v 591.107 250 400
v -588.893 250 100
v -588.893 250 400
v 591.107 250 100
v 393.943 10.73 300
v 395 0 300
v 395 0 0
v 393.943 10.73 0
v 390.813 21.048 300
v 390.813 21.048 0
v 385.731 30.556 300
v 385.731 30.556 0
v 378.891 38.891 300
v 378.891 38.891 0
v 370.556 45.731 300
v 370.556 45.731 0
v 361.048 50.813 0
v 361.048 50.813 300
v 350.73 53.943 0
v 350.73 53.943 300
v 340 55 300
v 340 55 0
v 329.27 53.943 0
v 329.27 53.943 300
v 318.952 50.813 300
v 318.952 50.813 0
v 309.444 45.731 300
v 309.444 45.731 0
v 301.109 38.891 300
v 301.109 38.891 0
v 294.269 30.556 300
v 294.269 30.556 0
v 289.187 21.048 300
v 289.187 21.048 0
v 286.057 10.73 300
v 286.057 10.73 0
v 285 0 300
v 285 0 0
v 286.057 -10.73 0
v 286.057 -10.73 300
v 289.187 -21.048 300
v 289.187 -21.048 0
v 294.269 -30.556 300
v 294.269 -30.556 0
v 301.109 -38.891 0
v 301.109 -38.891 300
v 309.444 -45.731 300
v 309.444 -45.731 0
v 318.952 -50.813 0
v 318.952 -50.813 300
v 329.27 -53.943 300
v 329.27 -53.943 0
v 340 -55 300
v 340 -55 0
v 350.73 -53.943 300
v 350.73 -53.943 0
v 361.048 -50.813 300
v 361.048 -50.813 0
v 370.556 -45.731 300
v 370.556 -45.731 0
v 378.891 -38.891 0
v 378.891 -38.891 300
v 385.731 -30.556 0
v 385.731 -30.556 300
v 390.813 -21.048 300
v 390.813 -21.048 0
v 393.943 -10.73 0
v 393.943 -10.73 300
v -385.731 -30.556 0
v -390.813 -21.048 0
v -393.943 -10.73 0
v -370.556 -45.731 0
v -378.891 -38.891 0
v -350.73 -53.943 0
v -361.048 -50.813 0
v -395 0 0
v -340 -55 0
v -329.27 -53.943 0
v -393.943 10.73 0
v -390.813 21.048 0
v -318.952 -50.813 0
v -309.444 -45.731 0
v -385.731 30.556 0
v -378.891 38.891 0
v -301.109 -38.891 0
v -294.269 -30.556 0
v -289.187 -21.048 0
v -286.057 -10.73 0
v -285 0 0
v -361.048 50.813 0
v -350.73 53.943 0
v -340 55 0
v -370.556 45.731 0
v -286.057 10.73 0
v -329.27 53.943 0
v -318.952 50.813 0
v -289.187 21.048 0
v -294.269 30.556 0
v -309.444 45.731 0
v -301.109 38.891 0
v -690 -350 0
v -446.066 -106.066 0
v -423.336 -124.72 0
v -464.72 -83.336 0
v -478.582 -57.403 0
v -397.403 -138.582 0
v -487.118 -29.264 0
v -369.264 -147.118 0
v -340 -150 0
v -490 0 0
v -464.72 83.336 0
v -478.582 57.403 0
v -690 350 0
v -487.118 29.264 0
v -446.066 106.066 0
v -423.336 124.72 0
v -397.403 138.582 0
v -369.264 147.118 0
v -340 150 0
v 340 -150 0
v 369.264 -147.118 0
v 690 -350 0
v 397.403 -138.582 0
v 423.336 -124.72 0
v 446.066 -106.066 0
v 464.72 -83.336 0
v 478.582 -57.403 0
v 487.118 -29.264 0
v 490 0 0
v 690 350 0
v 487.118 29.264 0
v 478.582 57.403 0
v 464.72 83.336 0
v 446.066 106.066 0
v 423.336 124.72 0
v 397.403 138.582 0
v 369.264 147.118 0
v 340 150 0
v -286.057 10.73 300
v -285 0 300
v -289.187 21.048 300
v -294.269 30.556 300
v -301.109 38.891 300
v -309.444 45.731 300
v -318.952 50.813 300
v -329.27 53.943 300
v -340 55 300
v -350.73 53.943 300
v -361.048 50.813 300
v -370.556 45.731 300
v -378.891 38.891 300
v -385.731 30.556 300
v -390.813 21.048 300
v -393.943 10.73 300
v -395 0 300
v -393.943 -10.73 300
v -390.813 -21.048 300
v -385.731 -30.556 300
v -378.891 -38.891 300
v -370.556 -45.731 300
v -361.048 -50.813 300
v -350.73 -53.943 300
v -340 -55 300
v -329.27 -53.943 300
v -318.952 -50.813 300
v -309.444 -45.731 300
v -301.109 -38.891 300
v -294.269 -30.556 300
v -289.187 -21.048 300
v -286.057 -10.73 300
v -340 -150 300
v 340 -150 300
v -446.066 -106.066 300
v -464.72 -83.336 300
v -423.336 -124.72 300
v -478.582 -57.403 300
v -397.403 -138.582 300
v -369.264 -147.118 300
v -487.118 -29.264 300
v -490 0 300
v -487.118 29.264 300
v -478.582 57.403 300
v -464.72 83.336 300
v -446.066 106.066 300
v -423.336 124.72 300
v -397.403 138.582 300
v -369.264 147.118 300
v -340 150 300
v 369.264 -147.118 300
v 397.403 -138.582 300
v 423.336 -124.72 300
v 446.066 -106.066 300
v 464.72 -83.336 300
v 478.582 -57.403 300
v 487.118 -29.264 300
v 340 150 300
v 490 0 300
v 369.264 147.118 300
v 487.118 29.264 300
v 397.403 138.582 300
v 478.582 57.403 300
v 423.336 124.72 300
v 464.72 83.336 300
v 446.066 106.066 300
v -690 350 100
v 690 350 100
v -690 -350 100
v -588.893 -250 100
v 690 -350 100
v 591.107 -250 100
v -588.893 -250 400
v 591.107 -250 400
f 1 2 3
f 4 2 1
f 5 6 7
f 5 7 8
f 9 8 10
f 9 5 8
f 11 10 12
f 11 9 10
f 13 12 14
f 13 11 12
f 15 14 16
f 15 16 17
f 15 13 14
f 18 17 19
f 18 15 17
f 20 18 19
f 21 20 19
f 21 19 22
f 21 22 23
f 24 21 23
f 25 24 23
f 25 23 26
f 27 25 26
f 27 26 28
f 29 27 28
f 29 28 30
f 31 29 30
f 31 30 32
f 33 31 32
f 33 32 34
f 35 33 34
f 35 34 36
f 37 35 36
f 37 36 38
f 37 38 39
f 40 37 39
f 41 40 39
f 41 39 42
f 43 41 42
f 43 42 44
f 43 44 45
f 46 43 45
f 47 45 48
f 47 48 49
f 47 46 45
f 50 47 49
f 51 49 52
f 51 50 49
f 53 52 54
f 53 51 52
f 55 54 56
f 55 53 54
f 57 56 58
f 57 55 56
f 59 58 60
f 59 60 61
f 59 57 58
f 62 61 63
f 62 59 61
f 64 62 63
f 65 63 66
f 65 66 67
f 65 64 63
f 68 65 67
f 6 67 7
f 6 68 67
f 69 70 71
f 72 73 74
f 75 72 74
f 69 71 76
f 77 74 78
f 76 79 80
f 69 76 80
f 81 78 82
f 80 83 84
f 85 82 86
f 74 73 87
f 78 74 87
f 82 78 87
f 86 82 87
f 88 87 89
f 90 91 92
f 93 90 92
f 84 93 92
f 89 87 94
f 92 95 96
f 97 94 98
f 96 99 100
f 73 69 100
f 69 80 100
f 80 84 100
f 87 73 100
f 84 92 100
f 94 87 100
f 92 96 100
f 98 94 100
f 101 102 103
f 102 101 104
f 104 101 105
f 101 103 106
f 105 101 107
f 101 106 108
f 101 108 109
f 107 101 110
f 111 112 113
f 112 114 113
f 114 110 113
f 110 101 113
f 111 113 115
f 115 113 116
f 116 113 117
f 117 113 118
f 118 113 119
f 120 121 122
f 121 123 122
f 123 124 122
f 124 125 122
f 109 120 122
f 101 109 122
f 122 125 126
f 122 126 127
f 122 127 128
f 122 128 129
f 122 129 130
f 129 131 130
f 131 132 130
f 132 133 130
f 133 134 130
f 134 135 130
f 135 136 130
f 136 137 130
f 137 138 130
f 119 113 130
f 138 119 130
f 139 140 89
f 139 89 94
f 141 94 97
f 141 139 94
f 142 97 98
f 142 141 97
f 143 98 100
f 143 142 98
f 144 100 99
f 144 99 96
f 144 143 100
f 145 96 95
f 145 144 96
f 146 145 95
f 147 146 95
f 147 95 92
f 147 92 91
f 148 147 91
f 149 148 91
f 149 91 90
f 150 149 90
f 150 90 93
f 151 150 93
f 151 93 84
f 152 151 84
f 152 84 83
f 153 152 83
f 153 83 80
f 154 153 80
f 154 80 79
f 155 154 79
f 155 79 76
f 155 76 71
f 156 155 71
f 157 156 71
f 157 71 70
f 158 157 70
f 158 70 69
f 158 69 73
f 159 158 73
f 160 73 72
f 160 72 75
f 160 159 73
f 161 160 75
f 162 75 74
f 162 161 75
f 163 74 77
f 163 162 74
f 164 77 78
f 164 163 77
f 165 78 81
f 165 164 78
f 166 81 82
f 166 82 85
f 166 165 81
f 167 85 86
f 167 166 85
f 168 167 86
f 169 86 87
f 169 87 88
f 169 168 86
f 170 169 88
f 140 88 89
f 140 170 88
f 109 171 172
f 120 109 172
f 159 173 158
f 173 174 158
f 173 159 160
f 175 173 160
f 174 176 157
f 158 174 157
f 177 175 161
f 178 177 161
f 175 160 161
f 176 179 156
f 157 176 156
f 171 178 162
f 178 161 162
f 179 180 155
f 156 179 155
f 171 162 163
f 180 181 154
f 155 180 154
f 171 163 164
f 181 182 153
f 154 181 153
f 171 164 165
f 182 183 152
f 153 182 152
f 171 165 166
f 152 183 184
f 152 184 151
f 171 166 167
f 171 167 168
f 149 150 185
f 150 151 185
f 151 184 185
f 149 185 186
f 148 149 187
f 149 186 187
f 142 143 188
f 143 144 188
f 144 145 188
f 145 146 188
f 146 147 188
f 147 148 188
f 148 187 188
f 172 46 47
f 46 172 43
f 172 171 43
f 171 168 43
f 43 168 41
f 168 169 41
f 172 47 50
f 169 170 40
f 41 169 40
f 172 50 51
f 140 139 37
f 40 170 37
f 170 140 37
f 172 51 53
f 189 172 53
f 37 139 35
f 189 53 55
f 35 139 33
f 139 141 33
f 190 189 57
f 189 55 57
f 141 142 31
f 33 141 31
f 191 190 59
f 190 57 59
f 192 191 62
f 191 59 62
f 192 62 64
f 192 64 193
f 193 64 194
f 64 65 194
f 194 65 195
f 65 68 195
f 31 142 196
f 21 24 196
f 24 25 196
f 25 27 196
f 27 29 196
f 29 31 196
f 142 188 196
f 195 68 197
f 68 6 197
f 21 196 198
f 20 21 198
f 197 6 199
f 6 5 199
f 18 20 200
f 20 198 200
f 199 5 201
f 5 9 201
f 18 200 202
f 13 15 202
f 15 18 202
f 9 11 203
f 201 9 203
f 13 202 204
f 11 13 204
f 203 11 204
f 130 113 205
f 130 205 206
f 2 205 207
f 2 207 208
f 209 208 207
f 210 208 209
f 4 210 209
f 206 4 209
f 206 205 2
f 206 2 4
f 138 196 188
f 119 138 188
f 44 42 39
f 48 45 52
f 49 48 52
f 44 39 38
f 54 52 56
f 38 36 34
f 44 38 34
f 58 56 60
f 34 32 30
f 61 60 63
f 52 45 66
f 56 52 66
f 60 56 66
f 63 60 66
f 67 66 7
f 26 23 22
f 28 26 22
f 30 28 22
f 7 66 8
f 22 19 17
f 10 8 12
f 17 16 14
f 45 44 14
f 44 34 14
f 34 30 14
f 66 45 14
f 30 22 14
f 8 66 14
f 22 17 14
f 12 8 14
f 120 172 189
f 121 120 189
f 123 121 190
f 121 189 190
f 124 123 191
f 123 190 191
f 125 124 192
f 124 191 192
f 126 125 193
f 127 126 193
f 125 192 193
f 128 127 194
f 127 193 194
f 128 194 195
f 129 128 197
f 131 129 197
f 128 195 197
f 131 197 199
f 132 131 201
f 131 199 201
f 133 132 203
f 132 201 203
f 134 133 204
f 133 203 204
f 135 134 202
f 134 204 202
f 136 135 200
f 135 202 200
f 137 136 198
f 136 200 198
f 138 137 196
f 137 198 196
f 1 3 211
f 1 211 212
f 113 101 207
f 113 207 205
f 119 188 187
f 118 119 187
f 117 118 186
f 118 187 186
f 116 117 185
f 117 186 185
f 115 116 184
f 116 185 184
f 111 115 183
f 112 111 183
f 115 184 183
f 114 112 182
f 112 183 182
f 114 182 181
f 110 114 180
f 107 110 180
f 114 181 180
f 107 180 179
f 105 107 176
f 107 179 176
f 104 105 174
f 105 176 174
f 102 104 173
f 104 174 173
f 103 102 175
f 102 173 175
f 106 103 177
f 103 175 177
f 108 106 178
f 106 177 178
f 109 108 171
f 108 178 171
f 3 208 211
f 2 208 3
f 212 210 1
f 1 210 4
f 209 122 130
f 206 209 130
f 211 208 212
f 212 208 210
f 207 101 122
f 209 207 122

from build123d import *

# Parameters (mm, degrees)
F0_W     = 1380
F0_H     = 700
F0_W_2   = 1180
F0_H_2   = 500
F1_DEPTH = 100
F2_W     = 1180
F2_H     = 500
F3_DEPTH = 300
F4_R     = 55
F5_DEPTH = 1819
F6_DEPTH = 400.001
F8_DEPTH = 100


# Not quite as in the source:
# - an extrude ends at something that could not be found from the text; its depth is read off the source's solid
# - a feature of the source that left no trace in its solid (it failed there, or was rolled back) is left out


with BuildPart() as f1:
    # F0 (on Top) → F1 (new body)
    with BuildSketch(Plane.XY):
        Rectangle(F0_W, F0_H)
        Rectangle(F0_W_2, F0_H_2, mode=Mode.SUBTRACT)
        Rectangle(F0_W_2, F0_H_2)
    extrude(amount=F1_DEPTH)

    # F2 (on face) → F3 (join)
    with BuildSketch(Plane.XY.offset(100)):
        with Locations((1.1069327593, 0)):
            Rectangle(F2_W, F2_H)
    extrude(amount=F3_DEPTH)

    # F4 (on face) → F5 (cut, through all)
    with BuildSketch(Plane.XY.offset(400)):
        with BuildLine():
            ThreePointArc((-340, 150), (-490, 0), (-340, -150))
            Line((-340, -150), (340, -150))
            ThreePointArc((340, -150), (490, 0), (340, 150))
            Line((340, 150), (-340, 150))
        make_face()
        with Locations((-340, 0)):
            Circle(F4_R, mode=Mode.SUBTRACT)
        with Locations((340, 0)):
            Circle(F4_R, mode=Mode.SUBTRACT)
    extrude(amount=F5_DEPTH, mode=Mode.SUBTRACT)

    # F4 (on face) → F6 (cut, through all)
    with BuildSketch(Plane.XY.offset(400)):
        with BuildLine():
            ThreePointArc((-340, 150), (-490, 0), (-340, -150))
            Line((-340, -150), (340, -150))
            ThreePointArc((340, -150), (490, 0), (340, 150))
            Line((340, 150), (-340, 150))
        make_face()
        with Locations((-340, 0)):
            Circle(F4_R, mode=Mode.SUBTRACT)
        with Locations((340, 0)):
            Circle(F4_R, mode=Mode.SUBTRACT)
    extrude(amount=-F6_DEPTH, mode=Mode.SUBTRACT)

    # F4 (on face) → F8 (join)
    with BuildSketch(Plane.XY.offset(400)):
        with BuildLine():
            ThreePointArc((-340, 150), (-490, 0), (-340, -150))
            Line((-340, -150), (340, -150))
            ThreePointArc((340, -150), (490, 0), (340, 150))
            Line((340, 150), (-340, 150))
        make_face()
        with Locations((-340, 0)):
            Circle(F4_R, mode=Mode.SUBTRACT)
        with Locations((340, 0)):
            Circle(F4_R, mode=Mode.SUBTRACT)
        with Locations((-340, 0)):
            Circle(F4_R)
        with Locations((340, 0)):
            Circle(F4_R)
    extrude(amount=-F8_DEPTH)


solid = f1.part
